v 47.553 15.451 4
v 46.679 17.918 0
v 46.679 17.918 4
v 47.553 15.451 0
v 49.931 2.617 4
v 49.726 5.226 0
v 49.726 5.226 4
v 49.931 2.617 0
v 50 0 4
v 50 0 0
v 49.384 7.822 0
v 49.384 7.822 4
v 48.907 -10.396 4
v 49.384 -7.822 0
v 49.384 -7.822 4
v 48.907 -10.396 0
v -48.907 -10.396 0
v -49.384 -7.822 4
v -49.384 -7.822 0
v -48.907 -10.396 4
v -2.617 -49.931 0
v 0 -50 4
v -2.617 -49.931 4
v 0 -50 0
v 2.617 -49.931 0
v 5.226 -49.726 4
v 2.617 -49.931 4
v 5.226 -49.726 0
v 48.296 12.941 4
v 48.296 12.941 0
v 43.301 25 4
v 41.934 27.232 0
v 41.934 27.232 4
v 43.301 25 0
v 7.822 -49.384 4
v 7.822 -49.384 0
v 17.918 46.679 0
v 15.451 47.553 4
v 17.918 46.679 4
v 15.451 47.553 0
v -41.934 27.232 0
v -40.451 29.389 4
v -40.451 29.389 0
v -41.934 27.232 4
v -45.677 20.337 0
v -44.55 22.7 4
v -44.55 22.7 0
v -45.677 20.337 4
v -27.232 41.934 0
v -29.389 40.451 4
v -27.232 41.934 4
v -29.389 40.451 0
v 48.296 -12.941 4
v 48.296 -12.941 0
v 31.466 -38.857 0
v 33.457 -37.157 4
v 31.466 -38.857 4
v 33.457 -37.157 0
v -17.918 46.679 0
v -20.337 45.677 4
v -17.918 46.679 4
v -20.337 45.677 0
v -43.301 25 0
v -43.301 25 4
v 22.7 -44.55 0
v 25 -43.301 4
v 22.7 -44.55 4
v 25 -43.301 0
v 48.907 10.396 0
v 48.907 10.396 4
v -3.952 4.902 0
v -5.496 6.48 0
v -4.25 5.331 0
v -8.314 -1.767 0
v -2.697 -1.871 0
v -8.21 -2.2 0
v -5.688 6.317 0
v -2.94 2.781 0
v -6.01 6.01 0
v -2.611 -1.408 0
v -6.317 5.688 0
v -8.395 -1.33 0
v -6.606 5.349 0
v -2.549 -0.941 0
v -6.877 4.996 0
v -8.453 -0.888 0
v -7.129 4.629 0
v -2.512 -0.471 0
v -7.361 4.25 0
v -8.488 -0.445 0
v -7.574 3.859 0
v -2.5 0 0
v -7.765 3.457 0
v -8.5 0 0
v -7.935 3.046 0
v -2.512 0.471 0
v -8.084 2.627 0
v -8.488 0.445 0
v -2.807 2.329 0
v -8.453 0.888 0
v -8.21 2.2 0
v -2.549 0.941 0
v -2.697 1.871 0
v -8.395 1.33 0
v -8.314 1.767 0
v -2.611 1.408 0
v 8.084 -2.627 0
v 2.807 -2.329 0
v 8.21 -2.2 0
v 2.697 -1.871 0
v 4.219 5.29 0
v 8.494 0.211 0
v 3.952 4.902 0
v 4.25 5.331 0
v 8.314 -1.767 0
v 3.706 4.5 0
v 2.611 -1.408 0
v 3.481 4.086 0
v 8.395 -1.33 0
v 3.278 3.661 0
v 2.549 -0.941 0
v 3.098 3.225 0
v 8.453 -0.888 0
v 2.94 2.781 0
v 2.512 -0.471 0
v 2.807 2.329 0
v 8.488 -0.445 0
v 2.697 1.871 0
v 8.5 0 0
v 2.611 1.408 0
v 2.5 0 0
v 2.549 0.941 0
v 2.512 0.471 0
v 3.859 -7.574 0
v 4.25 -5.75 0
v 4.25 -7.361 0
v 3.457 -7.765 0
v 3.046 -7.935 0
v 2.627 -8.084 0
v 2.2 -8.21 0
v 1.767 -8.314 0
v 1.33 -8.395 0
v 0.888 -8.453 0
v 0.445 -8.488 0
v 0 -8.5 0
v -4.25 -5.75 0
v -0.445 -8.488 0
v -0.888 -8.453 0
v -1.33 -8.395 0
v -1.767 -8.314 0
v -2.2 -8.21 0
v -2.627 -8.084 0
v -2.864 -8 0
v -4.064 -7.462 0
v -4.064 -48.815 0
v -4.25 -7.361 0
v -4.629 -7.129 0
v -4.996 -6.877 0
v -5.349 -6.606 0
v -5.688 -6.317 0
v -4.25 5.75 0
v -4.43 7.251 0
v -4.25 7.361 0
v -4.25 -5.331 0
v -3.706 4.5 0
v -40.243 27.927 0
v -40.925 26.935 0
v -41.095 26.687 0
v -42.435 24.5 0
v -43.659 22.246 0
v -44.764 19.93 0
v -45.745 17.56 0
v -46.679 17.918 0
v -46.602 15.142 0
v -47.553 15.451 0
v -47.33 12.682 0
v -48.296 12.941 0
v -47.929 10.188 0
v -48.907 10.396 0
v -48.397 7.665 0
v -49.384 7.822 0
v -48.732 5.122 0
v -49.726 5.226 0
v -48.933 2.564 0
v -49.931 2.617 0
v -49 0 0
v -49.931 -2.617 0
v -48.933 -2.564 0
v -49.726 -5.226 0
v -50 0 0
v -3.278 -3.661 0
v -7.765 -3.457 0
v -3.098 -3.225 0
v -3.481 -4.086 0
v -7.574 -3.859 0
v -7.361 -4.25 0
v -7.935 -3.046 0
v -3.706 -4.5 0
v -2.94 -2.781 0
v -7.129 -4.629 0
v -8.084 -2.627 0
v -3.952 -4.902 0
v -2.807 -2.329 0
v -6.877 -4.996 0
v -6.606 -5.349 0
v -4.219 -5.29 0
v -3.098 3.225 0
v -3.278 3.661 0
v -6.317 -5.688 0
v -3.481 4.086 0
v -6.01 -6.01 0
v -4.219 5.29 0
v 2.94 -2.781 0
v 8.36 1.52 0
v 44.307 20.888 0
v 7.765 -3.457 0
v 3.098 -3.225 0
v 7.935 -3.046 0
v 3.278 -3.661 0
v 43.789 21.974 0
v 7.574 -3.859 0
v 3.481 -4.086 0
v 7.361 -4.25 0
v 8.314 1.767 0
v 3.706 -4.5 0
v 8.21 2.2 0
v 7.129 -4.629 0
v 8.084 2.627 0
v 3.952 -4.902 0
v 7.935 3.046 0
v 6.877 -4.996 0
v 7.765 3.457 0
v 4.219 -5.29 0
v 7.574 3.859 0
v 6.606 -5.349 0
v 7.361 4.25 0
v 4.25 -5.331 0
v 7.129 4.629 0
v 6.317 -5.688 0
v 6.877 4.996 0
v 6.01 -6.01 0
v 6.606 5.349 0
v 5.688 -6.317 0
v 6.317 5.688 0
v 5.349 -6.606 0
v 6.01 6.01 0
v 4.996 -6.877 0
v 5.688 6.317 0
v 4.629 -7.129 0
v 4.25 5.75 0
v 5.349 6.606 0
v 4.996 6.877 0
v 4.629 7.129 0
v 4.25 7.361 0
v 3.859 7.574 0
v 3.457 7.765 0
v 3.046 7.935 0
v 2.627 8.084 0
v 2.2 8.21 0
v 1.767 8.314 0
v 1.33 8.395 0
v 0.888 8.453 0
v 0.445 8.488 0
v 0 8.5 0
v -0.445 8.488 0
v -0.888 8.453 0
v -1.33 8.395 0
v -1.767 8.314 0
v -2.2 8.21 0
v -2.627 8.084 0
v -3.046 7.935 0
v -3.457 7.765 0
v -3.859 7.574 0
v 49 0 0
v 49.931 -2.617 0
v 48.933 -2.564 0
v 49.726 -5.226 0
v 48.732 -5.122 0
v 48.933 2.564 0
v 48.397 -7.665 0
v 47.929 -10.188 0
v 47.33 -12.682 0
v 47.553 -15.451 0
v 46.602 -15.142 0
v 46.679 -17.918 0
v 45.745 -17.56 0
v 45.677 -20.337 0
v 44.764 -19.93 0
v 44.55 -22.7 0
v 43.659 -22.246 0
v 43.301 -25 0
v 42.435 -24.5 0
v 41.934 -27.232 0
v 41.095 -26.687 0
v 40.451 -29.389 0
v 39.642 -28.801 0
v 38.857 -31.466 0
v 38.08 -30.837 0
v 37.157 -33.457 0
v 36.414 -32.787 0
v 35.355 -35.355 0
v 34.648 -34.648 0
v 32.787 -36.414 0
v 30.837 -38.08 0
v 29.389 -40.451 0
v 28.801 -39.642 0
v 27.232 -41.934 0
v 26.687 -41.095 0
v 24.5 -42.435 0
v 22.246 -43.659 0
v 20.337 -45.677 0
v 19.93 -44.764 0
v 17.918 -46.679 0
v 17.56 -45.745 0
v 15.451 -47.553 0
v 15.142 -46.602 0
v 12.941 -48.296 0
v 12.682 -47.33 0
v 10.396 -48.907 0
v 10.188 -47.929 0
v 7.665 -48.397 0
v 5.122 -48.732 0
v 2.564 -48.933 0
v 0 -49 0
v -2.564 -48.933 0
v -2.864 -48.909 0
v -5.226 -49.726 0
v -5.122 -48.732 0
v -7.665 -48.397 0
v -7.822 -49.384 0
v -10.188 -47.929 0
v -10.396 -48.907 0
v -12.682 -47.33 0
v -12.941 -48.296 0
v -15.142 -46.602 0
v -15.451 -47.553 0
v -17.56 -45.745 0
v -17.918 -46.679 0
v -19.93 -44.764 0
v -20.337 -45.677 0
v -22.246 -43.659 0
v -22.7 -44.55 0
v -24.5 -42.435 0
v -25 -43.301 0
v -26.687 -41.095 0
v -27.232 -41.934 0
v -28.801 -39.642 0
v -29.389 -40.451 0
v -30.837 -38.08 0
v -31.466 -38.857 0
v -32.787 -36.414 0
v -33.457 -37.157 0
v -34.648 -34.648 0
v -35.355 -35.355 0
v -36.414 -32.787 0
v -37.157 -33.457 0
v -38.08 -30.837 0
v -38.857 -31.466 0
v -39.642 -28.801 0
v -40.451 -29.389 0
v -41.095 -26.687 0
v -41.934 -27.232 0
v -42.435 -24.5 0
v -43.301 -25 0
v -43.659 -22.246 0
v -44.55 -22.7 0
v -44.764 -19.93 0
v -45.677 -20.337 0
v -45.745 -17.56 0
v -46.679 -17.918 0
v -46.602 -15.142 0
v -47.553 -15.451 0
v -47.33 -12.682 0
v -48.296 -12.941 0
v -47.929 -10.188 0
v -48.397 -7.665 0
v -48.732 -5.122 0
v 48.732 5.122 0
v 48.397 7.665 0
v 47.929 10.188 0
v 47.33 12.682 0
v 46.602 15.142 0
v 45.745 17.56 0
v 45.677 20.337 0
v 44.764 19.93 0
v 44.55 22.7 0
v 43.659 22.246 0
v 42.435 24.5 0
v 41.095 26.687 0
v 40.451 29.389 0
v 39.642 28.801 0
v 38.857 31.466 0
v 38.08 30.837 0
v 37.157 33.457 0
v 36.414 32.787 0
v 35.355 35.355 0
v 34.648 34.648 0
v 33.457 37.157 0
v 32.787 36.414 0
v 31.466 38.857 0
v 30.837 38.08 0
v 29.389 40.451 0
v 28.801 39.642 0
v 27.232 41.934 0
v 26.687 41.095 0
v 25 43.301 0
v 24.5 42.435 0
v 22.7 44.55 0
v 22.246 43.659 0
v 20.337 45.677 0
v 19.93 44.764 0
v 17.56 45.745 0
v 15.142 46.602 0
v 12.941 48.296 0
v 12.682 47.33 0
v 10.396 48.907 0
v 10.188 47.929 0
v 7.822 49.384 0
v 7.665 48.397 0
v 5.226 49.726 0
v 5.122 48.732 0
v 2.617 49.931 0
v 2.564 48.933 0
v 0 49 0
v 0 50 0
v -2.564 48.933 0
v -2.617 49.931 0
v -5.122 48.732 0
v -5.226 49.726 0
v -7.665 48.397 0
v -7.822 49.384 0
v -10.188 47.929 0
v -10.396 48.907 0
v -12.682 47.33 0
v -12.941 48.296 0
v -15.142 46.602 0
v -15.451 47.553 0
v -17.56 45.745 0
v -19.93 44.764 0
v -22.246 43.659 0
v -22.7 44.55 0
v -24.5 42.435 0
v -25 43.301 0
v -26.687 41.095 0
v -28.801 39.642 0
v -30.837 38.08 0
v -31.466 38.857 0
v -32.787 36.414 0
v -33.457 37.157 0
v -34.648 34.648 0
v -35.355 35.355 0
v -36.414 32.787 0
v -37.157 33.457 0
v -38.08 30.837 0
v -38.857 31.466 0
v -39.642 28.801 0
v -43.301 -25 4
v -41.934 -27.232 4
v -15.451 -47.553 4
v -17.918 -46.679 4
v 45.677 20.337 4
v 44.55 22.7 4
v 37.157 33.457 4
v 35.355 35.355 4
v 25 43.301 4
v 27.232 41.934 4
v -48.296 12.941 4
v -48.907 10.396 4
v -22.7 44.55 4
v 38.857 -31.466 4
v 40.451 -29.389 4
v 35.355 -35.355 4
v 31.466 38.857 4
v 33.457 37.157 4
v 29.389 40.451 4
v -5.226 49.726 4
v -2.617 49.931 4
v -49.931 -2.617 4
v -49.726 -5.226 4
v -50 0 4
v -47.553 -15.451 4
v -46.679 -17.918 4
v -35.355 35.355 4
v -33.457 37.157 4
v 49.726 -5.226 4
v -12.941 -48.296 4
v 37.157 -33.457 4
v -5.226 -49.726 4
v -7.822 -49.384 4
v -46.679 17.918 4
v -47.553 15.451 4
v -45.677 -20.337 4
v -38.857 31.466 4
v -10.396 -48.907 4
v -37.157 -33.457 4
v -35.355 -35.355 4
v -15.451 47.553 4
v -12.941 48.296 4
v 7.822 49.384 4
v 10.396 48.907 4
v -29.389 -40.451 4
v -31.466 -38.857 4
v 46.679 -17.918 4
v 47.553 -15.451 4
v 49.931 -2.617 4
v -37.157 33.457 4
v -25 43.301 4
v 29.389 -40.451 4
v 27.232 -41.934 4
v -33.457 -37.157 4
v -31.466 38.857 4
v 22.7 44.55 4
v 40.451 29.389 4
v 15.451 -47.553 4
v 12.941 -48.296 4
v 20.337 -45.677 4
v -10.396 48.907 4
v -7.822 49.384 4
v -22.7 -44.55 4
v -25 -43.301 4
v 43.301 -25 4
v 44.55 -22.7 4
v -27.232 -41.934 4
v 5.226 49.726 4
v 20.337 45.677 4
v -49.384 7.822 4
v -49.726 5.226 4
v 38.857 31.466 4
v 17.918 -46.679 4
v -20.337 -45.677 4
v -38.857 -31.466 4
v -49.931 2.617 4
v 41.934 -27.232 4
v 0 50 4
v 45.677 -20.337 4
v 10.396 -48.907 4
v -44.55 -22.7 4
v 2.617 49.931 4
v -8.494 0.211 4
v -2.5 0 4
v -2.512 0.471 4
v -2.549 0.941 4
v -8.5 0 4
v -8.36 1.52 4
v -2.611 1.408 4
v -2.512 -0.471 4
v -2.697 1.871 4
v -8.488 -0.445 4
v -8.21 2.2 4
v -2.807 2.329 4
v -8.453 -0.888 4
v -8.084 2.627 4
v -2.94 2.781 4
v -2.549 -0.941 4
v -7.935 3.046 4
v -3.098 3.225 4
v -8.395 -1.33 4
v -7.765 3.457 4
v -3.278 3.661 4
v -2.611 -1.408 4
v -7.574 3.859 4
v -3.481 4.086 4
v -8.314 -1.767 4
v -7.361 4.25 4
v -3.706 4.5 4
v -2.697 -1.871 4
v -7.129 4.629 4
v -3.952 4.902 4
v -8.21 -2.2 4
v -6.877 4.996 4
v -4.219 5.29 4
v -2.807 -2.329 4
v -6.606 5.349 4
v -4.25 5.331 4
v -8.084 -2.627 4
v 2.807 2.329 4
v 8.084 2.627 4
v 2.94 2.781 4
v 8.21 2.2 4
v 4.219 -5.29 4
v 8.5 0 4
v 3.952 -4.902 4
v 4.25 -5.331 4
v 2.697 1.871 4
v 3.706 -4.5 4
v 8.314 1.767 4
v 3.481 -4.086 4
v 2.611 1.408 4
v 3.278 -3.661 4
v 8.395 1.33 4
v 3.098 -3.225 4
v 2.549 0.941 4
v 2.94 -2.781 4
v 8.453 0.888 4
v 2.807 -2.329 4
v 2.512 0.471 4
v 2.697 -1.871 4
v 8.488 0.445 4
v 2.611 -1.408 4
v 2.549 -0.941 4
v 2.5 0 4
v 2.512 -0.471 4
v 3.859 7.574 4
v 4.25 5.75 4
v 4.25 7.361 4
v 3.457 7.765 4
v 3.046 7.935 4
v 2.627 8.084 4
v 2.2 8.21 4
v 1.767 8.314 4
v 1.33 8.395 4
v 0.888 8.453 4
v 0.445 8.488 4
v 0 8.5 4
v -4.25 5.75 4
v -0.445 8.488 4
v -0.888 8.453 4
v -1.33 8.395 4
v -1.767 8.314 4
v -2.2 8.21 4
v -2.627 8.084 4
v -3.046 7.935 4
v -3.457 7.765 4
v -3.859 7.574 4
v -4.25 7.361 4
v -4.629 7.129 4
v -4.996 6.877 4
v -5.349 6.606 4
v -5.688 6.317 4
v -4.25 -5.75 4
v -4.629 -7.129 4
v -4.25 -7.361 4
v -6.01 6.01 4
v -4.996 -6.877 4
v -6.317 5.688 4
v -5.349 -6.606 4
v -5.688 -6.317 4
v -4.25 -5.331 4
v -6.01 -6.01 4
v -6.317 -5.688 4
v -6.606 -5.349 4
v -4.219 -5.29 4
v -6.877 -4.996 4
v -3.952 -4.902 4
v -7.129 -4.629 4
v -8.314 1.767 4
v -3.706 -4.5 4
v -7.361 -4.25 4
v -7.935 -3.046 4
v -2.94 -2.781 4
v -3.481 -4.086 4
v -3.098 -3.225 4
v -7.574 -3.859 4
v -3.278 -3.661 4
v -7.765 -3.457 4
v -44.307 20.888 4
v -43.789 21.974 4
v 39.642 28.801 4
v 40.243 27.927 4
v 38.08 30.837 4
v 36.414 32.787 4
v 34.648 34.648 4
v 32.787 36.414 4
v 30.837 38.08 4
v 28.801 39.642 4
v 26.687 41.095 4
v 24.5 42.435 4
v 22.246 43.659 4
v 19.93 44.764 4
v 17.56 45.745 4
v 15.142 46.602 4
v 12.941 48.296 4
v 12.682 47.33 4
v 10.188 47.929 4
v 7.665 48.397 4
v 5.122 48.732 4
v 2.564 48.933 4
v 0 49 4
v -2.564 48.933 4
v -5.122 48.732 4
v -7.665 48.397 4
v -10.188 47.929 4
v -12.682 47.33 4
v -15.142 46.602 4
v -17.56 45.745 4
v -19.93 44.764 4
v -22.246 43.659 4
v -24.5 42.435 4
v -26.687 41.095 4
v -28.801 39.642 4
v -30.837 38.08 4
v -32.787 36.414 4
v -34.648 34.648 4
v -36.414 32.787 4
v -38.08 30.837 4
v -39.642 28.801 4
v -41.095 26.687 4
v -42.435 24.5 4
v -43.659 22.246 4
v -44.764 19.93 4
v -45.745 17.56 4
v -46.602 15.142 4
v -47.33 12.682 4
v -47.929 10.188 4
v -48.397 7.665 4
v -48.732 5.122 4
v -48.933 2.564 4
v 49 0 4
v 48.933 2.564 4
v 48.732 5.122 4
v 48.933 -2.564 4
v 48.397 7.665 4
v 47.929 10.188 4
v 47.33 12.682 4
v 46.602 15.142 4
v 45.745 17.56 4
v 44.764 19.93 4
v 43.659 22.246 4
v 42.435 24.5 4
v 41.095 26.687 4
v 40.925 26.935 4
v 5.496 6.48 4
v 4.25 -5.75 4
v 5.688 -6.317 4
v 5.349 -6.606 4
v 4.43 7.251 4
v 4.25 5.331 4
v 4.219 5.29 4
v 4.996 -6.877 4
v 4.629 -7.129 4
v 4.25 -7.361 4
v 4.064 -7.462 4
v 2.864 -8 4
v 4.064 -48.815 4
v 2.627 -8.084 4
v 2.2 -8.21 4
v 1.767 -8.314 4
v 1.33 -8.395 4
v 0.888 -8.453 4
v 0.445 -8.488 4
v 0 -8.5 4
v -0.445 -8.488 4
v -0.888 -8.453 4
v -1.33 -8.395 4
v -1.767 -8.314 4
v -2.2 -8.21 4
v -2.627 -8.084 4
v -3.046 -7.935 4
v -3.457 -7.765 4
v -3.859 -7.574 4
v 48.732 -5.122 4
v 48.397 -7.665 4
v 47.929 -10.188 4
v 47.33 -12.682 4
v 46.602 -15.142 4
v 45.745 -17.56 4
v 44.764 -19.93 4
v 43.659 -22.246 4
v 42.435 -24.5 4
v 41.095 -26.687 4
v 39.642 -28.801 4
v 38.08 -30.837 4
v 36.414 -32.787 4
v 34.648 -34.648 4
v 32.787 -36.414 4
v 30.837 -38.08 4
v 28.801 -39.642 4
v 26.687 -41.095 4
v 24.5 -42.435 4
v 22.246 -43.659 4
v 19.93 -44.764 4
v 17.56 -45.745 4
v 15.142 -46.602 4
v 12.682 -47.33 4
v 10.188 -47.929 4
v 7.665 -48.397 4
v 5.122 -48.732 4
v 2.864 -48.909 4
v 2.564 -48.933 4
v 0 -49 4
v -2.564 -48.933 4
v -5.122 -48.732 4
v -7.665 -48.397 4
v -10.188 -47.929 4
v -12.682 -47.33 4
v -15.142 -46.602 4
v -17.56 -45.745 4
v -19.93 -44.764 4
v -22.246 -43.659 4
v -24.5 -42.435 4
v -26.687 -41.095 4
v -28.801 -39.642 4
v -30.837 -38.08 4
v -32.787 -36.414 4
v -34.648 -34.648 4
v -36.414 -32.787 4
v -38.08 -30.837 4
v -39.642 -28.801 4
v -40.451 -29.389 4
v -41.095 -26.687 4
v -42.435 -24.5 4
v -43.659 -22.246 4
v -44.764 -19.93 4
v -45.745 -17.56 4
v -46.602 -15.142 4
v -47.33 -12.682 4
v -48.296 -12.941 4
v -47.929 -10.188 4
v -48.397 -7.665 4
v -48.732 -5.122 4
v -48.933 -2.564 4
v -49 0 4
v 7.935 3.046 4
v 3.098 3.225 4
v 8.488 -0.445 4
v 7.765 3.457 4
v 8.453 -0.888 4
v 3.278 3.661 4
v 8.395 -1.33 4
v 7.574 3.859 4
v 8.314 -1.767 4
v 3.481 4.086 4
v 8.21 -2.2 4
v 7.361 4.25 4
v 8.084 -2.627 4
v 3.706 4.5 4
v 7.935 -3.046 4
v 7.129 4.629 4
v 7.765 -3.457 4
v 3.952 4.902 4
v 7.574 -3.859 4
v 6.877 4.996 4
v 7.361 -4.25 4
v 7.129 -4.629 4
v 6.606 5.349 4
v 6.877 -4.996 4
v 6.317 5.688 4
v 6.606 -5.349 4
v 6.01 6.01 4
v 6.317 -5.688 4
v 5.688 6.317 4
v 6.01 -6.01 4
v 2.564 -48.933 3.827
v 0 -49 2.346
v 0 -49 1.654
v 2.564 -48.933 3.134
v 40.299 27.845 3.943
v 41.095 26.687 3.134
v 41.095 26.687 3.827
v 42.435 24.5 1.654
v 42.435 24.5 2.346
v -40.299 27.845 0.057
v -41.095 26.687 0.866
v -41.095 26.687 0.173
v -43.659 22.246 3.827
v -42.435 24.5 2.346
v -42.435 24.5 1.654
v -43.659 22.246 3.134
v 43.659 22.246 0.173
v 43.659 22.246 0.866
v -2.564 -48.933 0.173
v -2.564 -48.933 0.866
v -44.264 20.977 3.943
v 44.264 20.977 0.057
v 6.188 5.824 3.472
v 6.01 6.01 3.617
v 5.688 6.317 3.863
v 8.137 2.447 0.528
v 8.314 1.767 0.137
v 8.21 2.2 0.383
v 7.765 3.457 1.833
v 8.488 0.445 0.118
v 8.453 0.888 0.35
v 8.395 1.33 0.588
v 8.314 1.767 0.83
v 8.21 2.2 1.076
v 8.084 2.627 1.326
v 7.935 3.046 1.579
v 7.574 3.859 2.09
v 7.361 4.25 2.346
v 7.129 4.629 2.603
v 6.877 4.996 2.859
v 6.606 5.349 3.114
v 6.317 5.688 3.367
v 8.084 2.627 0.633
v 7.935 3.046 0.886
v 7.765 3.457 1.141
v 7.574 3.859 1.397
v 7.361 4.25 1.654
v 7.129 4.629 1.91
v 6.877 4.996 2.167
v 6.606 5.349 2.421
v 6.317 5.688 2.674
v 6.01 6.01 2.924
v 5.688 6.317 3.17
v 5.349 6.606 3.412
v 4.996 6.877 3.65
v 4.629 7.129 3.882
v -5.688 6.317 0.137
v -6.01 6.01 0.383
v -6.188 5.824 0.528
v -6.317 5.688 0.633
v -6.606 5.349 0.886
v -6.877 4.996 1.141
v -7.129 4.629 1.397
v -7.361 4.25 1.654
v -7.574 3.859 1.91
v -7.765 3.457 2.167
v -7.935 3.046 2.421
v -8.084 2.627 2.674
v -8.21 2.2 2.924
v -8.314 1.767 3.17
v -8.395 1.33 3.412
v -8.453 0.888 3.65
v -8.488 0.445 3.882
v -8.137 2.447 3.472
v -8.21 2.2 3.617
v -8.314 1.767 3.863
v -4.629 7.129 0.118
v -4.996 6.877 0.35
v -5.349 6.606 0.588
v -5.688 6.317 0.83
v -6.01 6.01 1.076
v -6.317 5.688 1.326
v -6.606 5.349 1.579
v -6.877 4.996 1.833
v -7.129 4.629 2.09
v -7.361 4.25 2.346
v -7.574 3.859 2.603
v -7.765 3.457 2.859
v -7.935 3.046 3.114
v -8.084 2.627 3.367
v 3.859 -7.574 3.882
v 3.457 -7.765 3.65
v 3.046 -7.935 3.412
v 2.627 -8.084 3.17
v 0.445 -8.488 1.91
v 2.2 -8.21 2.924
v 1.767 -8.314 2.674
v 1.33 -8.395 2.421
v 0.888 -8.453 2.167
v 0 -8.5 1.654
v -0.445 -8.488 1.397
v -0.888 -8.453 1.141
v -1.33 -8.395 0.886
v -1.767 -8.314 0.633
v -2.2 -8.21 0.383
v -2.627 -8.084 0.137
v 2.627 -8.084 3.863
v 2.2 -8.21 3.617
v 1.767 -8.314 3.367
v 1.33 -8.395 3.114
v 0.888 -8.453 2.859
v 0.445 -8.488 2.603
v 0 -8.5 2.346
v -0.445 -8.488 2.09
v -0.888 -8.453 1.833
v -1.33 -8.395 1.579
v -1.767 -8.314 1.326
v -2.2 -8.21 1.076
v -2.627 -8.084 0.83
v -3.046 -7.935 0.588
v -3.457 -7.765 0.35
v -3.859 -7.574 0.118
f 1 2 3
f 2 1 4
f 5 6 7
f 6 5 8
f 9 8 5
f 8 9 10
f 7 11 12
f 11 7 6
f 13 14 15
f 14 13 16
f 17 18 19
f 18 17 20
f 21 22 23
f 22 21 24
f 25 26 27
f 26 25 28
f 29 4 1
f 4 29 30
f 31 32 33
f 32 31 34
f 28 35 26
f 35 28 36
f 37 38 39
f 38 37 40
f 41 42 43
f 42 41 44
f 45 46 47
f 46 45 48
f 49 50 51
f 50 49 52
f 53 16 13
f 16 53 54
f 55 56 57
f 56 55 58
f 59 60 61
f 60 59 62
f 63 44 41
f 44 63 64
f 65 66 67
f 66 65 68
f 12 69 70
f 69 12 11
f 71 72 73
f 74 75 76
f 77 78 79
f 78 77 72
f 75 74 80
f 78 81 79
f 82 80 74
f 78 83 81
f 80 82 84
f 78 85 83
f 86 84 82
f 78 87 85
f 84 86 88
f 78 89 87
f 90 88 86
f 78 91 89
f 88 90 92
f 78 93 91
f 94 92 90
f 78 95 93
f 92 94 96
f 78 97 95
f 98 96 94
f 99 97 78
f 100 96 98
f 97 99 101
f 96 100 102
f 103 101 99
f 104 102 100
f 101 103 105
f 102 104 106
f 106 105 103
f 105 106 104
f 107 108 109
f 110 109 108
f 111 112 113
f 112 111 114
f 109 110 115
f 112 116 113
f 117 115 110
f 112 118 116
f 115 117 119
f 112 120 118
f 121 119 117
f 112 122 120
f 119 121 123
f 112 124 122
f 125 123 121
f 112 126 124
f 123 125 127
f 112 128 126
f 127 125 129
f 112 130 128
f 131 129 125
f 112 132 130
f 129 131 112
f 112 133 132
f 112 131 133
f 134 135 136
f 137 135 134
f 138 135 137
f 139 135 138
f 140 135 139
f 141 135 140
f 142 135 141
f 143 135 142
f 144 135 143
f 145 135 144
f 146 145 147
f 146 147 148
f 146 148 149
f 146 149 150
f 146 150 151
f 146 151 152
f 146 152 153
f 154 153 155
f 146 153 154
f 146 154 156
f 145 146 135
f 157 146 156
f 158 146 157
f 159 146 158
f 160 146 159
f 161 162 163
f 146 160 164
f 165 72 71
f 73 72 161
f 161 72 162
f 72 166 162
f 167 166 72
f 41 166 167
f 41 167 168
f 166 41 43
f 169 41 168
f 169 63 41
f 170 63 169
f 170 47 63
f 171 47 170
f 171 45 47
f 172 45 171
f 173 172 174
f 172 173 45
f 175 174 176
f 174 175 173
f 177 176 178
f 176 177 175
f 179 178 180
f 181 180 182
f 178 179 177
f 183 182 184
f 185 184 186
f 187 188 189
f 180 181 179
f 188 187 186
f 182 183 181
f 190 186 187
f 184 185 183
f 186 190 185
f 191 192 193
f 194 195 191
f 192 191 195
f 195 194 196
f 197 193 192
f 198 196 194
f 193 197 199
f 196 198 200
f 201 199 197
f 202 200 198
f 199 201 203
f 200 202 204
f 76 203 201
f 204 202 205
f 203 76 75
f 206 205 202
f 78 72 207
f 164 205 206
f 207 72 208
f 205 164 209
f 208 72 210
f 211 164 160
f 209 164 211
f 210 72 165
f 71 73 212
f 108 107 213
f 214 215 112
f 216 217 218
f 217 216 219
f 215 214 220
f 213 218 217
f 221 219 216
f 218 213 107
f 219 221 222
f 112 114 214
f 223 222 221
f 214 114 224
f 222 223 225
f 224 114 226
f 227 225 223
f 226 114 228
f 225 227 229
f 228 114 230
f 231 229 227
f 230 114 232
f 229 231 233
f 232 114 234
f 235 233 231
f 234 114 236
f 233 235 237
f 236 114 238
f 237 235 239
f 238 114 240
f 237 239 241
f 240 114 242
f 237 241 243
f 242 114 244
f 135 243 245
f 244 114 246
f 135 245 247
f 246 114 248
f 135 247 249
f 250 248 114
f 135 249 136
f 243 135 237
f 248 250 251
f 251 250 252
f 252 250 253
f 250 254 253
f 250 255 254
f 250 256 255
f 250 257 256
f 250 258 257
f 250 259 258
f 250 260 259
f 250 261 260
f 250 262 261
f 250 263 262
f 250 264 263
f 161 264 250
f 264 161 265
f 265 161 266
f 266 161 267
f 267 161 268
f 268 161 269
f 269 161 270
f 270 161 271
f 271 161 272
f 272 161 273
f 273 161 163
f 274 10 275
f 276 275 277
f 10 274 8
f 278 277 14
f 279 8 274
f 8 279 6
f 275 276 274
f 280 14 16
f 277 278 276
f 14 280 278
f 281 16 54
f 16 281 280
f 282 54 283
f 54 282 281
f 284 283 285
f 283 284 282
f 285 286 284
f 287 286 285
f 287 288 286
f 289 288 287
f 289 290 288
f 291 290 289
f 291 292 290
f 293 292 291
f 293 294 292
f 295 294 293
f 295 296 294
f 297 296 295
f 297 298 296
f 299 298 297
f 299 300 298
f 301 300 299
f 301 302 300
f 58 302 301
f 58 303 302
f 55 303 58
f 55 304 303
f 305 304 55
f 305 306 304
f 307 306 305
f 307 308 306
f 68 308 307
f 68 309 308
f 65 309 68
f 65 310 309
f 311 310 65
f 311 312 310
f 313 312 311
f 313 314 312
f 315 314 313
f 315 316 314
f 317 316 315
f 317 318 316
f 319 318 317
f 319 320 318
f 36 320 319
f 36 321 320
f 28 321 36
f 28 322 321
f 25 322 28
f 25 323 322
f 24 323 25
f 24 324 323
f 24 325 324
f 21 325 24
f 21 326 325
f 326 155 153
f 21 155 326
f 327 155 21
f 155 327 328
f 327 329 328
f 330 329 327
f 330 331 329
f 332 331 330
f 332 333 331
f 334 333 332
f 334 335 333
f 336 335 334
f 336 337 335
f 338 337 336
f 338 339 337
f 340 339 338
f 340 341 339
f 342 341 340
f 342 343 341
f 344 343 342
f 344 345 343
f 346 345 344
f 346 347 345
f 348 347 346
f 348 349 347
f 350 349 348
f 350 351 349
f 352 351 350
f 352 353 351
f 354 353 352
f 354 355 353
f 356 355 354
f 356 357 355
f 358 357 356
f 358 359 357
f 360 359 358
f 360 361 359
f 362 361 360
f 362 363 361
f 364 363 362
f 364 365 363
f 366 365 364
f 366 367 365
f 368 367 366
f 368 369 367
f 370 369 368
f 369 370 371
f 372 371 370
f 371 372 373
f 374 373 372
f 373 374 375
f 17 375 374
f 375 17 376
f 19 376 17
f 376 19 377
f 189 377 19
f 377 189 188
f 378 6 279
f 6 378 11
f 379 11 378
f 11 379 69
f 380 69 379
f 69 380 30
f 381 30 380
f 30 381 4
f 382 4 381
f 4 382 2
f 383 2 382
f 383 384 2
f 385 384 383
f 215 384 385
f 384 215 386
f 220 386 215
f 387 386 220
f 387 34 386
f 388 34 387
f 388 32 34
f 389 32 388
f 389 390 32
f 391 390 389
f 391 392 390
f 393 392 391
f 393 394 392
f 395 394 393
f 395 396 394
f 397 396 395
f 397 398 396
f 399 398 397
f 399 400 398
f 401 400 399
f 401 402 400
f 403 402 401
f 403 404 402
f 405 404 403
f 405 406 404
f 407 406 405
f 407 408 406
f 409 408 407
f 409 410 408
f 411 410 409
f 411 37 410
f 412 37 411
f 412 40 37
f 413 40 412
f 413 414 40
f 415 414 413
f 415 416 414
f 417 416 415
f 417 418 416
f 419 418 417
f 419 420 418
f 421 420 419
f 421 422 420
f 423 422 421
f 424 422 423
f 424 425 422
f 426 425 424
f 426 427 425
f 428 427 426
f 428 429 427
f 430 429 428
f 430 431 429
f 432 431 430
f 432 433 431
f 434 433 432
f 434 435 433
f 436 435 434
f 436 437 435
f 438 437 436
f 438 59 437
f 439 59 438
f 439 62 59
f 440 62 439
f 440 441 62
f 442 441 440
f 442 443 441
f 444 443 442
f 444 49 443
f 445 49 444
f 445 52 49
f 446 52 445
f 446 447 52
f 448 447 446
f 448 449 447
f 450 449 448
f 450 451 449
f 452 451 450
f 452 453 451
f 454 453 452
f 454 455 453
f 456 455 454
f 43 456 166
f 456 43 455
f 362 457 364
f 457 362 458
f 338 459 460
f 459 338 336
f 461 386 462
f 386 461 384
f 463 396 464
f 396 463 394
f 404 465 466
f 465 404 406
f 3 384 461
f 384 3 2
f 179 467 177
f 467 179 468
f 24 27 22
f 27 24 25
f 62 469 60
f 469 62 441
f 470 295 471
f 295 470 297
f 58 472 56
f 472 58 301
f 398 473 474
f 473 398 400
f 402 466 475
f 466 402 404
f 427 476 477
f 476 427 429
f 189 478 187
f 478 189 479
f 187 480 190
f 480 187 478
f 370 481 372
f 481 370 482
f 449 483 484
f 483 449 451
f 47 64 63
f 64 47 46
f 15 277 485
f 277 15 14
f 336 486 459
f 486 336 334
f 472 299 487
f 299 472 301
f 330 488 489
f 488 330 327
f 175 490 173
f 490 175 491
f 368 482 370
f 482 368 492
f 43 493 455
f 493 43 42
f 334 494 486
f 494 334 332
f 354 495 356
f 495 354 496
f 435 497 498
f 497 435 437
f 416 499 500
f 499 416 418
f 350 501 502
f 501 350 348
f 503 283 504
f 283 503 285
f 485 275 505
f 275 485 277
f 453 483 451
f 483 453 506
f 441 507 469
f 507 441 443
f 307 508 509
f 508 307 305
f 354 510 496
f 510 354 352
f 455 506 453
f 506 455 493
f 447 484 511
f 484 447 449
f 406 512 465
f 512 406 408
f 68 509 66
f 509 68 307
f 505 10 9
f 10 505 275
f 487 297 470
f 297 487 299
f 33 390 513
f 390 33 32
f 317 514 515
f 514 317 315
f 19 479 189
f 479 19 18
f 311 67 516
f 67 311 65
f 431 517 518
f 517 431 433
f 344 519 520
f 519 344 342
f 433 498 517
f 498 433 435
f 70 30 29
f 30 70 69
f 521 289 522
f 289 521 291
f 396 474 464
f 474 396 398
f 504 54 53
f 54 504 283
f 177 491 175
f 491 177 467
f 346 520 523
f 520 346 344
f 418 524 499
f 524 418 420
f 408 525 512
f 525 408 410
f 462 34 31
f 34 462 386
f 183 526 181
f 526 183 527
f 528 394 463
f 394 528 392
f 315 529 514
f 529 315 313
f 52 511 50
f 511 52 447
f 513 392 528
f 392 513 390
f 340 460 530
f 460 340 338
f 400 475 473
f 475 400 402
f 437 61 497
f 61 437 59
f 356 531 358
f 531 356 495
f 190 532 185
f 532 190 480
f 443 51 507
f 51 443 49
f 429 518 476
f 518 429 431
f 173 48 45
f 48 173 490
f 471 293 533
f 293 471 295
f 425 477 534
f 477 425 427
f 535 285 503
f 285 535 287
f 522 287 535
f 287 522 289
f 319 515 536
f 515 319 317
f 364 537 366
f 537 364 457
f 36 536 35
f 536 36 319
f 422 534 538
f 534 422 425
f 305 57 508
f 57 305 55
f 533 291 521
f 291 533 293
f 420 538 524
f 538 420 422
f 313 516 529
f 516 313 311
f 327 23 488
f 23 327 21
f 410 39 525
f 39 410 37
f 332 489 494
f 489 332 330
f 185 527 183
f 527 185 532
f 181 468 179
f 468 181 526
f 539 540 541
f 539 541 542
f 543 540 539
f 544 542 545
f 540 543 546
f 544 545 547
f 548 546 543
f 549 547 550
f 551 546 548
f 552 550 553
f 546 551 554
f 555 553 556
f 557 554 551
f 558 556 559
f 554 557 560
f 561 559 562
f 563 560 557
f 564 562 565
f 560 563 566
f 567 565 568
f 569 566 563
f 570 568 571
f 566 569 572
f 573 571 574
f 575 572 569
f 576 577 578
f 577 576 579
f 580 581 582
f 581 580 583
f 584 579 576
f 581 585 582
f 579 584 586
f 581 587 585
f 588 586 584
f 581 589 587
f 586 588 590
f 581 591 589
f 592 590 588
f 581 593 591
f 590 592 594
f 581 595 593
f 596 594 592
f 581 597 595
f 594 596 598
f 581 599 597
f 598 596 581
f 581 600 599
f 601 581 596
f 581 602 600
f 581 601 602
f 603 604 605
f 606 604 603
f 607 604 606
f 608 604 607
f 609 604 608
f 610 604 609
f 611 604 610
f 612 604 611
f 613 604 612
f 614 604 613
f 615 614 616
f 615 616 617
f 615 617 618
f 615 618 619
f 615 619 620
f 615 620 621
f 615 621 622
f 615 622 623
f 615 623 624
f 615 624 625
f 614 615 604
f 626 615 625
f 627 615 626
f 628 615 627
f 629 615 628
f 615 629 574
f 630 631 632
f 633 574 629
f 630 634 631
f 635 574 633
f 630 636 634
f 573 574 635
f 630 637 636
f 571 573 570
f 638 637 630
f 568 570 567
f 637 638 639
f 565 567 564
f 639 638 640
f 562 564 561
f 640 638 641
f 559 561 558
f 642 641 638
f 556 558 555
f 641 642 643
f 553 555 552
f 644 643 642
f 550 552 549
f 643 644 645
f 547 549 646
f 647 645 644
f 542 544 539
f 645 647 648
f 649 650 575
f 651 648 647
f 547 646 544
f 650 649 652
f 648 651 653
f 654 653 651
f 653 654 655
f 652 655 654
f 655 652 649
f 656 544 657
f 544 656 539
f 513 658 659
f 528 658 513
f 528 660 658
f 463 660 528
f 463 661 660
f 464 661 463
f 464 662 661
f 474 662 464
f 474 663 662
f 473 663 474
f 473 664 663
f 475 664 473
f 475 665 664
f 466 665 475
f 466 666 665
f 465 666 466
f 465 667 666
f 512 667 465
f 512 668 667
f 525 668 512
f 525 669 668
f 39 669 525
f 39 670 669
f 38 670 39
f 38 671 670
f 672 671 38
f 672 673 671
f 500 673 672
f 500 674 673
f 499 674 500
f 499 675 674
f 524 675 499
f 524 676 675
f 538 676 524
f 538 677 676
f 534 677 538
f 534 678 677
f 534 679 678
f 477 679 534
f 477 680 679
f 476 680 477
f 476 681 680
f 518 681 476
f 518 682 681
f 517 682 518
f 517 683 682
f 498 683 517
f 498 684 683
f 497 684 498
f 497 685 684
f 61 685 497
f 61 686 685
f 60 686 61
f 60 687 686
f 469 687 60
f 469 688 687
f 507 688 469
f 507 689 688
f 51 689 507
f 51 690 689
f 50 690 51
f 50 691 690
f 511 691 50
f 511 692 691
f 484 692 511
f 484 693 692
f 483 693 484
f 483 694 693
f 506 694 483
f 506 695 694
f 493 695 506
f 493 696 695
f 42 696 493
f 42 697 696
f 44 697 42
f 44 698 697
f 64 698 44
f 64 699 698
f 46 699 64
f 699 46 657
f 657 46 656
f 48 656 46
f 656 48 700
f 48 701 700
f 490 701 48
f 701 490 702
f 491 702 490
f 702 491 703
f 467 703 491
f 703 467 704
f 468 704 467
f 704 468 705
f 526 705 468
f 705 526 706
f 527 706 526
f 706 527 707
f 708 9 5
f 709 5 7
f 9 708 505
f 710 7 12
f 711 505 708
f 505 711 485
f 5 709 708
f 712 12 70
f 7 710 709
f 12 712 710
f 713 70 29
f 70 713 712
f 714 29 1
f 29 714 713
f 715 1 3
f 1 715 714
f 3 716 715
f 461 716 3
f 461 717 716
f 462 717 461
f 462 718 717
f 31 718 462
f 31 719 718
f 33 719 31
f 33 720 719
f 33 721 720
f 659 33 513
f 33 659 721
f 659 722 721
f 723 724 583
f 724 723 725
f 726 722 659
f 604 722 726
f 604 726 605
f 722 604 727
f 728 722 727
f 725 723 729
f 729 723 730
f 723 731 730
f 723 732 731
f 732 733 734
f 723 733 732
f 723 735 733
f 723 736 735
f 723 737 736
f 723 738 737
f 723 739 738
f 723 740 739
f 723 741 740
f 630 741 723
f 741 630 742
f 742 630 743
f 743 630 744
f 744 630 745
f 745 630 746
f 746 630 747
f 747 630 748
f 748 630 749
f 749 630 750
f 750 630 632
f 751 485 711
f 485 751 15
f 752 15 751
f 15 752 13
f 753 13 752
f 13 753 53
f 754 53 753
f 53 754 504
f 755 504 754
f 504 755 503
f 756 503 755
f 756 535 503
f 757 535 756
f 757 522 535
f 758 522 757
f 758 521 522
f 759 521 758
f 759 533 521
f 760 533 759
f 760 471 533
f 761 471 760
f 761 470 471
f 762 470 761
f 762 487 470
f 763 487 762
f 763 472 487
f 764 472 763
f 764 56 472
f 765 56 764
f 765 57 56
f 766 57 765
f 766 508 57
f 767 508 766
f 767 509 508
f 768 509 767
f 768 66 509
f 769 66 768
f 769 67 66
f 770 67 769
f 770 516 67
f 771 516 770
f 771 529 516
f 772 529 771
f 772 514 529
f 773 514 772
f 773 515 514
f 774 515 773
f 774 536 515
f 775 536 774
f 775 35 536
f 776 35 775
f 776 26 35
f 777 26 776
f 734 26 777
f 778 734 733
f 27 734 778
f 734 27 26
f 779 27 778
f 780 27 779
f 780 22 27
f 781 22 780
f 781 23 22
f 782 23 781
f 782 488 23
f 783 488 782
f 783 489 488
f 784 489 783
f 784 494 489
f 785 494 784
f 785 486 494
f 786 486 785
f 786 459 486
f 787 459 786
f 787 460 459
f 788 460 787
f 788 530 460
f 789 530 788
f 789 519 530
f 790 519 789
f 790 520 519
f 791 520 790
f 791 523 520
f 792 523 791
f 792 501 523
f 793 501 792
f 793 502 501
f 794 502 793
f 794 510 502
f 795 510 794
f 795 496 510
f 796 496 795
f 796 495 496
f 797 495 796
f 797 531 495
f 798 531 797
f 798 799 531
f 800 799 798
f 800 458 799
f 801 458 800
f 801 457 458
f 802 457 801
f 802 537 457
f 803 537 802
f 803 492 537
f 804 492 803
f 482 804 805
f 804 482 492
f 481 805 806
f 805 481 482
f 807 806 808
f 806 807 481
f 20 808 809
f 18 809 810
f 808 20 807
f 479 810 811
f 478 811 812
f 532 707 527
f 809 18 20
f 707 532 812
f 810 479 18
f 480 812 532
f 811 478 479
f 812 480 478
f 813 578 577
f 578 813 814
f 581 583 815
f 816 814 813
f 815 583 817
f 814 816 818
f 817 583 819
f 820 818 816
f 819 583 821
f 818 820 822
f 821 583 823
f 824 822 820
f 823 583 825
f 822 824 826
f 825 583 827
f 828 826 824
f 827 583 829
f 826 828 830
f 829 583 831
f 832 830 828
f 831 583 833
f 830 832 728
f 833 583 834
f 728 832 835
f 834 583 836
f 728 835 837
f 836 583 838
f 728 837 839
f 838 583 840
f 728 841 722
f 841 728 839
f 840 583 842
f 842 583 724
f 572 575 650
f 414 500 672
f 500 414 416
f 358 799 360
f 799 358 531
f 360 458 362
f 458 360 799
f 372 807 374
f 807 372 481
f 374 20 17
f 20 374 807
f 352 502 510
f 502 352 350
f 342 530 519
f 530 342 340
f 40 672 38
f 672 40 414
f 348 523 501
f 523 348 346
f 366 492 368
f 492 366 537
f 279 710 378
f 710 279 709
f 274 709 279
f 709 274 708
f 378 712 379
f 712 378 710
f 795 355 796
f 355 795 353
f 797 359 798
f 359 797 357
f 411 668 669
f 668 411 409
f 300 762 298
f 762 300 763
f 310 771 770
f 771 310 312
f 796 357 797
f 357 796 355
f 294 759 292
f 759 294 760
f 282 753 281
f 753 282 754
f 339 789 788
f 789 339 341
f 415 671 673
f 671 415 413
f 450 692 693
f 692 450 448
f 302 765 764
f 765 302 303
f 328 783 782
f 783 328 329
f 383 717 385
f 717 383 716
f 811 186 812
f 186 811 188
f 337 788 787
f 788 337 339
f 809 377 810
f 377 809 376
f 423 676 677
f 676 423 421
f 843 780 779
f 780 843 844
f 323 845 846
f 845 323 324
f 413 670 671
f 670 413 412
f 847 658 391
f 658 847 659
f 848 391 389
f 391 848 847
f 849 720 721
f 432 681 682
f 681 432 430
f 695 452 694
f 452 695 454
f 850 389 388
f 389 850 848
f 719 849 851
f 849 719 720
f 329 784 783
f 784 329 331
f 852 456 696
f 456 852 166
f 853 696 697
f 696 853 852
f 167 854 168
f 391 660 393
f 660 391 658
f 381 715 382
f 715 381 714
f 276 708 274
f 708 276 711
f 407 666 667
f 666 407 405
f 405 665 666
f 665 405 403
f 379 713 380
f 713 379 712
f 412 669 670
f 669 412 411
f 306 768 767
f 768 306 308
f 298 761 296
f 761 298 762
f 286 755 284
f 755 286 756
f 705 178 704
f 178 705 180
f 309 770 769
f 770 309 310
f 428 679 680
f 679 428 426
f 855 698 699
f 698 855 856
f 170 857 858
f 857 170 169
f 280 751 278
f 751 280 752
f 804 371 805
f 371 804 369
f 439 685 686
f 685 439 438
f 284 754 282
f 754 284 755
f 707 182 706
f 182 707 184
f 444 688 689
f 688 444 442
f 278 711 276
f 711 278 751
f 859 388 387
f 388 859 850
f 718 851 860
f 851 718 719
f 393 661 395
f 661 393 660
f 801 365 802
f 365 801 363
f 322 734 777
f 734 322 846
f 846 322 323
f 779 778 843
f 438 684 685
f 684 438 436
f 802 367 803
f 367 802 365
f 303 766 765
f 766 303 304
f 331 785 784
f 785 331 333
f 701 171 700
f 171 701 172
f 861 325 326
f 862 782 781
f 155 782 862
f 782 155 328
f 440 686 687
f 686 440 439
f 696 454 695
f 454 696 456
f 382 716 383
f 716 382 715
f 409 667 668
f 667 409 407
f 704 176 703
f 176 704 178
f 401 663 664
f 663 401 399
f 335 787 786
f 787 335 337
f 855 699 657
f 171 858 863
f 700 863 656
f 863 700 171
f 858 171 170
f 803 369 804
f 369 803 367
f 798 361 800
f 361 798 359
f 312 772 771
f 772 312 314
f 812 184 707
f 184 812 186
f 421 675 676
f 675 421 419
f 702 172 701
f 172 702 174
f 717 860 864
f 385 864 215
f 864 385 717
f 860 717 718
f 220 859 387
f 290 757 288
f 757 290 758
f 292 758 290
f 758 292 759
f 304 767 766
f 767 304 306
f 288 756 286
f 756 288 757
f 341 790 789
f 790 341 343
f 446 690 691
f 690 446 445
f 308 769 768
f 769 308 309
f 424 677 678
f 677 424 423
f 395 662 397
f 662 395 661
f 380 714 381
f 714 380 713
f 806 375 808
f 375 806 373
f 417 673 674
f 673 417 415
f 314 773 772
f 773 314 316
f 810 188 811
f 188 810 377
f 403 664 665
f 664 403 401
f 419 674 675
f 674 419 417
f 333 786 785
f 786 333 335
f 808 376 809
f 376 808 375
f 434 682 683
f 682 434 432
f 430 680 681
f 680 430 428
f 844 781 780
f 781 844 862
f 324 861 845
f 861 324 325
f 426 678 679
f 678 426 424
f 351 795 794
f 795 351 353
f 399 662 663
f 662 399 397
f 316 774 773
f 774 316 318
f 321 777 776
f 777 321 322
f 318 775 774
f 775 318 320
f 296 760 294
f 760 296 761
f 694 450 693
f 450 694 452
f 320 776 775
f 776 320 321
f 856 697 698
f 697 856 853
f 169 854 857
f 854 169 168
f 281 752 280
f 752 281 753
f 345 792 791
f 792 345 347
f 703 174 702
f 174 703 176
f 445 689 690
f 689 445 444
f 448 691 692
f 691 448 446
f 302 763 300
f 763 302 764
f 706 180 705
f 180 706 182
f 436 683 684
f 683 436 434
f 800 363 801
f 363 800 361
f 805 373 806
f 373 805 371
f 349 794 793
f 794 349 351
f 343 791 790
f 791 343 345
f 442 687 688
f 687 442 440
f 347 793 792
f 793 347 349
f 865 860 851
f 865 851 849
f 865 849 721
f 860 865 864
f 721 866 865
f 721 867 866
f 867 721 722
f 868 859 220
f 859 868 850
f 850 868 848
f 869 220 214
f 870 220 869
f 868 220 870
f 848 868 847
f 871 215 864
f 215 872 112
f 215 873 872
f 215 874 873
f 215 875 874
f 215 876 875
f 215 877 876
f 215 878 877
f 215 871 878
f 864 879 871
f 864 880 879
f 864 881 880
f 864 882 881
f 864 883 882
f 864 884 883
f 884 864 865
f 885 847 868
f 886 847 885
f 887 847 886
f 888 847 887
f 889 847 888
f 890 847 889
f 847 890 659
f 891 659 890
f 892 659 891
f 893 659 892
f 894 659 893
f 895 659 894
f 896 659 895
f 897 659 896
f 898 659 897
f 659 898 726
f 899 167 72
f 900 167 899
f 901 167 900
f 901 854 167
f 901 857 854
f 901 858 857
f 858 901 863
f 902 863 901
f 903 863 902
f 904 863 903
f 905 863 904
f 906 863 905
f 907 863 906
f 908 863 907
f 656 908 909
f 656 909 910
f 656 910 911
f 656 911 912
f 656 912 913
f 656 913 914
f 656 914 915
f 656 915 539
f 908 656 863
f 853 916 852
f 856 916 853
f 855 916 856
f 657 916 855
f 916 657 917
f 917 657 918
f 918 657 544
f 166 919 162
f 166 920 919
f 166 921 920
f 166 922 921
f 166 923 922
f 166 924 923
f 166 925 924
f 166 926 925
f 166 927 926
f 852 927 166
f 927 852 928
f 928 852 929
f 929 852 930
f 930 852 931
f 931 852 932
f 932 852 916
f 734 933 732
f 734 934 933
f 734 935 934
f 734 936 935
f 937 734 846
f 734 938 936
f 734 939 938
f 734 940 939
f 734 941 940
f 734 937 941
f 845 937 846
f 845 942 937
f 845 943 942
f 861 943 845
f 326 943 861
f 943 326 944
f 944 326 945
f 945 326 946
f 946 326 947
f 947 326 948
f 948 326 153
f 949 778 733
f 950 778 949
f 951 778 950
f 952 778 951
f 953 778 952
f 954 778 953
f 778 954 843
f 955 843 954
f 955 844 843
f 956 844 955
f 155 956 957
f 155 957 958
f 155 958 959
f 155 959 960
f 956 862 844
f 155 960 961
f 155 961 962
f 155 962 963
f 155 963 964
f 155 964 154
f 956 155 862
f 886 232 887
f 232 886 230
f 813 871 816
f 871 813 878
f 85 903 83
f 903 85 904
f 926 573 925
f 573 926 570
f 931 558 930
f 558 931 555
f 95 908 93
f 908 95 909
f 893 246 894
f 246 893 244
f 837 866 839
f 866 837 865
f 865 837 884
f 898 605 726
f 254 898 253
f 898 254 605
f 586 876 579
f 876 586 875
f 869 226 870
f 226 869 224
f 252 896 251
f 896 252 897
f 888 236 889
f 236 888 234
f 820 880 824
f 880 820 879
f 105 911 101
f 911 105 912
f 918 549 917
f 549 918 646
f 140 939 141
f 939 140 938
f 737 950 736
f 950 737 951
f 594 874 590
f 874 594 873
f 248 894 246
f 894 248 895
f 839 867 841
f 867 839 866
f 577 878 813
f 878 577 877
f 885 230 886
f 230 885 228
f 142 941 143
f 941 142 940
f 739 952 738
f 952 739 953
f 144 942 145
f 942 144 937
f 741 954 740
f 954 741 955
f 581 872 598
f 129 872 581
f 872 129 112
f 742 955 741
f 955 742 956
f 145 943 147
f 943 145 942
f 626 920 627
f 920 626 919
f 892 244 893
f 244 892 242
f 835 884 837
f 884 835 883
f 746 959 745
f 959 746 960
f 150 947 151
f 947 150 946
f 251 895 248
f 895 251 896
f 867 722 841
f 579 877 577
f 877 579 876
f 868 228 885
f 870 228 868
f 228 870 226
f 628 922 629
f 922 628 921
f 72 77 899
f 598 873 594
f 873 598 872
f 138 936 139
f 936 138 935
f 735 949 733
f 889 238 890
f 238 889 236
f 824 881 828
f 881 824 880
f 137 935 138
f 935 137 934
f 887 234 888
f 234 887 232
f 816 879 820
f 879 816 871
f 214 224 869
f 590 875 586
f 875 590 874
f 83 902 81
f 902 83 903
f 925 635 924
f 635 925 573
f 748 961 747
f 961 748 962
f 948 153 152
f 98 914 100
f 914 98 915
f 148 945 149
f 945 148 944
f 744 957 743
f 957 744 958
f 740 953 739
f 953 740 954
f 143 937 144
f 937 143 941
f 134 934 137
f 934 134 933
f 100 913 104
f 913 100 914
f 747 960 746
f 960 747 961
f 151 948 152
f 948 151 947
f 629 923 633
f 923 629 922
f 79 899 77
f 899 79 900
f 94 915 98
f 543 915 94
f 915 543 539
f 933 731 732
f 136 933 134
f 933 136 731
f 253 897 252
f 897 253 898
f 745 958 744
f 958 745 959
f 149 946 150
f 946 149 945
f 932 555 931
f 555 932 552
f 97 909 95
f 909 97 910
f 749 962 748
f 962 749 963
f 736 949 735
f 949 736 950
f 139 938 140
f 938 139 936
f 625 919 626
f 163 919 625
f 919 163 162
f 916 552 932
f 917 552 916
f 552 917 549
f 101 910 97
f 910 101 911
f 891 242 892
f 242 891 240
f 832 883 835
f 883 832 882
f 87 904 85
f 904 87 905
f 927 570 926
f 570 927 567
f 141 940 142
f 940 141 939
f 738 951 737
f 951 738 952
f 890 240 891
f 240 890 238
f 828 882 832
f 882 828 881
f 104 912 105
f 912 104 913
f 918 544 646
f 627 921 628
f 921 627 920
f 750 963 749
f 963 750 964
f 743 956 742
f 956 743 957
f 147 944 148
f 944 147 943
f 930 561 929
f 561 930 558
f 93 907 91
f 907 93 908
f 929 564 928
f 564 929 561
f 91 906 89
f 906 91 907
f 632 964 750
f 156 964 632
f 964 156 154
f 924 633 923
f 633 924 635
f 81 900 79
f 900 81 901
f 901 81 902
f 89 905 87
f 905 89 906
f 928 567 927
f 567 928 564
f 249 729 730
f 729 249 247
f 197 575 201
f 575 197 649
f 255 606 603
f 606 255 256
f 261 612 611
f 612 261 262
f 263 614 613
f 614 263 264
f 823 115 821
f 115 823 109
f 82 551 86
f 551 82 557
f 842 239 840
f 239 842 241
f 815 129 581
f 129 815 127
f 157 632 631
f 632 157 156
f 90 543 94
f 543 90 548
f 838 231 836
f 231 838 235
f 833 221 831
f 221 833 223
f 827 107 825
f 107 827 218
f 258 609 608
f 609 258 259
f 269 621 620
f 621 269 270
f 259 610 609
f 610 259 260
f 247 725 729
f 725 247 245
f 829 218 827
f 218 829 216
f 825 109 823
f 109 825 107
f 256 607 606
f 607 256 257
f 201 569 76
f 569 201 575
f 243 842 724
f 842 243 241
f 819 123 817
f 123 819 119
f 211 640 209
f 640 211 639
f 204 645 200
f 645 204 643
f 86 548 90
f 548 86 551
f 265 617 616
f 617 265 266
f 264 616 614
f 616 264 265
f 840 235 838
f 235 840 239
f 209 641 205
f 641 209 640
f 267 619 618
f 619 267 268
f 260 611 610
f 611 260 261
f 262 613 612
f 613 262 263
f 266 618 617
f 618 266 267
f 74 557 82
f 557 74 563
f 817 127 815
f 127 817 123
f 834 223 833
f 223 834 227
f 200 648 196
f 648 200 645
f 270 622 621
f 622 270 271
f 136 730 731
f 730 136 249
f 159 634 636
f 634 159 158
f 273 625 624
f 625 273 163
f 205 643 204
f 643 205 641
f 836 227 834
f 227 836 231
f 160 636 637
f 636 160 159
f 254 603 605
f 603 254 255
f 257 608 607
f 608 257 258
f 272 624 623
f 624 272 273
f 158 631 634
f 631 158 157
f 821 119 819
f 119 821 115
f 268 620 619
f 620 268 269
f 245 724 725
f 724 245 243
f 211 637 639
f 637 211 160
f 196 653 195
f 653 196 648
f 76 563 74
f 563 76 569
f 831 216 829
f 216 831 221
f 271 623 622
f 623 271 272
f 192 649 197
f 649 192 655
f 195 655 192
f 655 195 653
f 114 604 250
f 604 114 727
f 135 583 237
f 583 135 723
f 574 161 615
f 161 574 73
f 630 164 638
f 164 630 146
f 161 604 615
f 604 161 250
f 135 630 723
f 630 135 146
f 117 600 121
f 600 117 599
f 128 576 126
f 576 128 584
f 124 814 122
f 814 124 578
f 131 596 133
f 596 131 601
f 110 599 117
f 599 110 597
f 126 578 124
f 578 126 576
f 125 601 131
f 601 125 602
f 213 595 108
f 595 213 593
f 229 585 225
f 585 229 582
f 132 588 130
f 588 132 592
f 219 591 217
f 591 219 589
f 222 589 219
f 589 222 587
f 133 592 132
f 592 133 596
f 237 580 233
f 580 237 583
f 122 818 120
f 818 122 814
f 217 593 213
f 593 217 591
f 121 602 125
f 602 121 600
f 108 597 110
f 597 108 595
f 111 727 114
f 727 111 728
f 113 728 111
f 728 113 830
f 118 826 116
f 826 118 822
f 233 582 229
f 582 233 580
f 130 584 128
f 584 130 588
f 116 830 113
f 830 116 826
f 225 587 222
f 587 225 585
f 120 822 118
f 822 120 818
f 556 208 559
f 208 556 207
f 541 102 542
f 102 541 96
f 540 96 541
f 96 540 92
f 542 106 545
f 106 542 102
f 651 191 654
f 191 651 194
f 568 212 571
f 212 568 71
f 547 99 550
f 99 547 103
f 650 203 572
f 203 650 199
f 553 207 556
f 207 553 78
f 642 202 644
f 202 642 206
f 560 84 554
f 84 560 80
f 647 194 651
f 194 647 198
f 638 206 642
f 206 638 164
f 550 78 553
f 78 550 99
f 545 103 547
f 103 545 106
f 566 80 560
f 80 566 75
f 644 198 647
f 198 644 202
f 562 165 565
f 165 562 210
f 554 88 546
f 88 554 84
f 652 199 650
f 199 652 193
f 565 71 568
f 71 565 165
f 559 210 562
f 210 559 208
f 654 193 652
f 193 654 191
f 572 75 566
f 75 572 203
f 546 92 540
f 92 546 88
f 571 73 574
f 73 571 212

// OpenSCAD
/************************************************/
/*       Propeller for Spiral Launch Pad        */
/************************************************/
/*          programmed by Tiger M. Cho          */
/*                 2017. 9. 6                   */
/*              tigermcho@gmail.com             */
/************************************************/


No_of_Blades = 3;    // [2:1:6]
Pitch_angle = 30;    // [20:5:45]
Ring_Diameter = 100;   // [70:5:150]
Ring_Height = 4 ;      // [3:0.5:5] 
Ring_Thickness= 1 ;    // [0.8:0.2:2.0]

/*[hidden]*/
$fn = 120;  // resolution
Hub_Diameter=17;
Hub_Height=Ring_Height;

/*Draw a Ring*/

  difference(){
    cylinder(h=Ring_Height,d=Ring_Diameter);
    cylinder(h=Ring_Height,d=Ring_Diameter-Ring_Thickness*2);    
  }

/*Draw Blades*/
l_h=Ring_Diameter/2-2-Ring_Thickness/2;
l_y=Ring_Height;
l_x=l_y/tan(Pitch_angle);
difference(){
   make_Propeller(No_of_Blades,l_h,l_x,l_y);
   cylinder(h=Hub_Height,d=Hub_Diameter);  
}

/*Draw a Propeller Hub*/
{
difference(){
      cylinder(h=Hub_Height,d=Hub_Diameter);    
      translate([0,0,Ring_Height/2]) cube([8.5,11.5,Ring_Height],true);
} 

difference(){
   translate([11.5,0,0]) cylinder(h=Hub_Height,d=18); 
   translate([14.25,0,Ring_Height/2]) cube([19.5,19.5,Ring_Height],true);  
} 
difference(){
   translate([-11.5,0,0]) cylinder(h=Hub_Height,d=18); 
   translate([-14.25,0,Ring_Height/2]) cube([19.5,19.5,Ring_Height],true);  
} 
}


module make_Propeller(n,h,x,y){ 
  if(n>1) {
      blade(h,x,y);  
      angle=360/n;  nend=n;
            
      for (i =[2:nend]) {
          rotate([0,0,angle*(i-1)])blade(h,x,y); 
      } 
      
  } else {
      blade(h,x,y);  
      rotate([0,0,180])blade(h,x,y); 
  } 
}


module blade(h,x,y ){  // modeling a blade.
    
    rotate([90,0,0]) translate([-(1.2+x)/2,0.0,2.0])
    linear_extrude(height = h)
    polygon(points=[[0,0],[1.2,0],[1.2+x,y],[x,y]]);
}
